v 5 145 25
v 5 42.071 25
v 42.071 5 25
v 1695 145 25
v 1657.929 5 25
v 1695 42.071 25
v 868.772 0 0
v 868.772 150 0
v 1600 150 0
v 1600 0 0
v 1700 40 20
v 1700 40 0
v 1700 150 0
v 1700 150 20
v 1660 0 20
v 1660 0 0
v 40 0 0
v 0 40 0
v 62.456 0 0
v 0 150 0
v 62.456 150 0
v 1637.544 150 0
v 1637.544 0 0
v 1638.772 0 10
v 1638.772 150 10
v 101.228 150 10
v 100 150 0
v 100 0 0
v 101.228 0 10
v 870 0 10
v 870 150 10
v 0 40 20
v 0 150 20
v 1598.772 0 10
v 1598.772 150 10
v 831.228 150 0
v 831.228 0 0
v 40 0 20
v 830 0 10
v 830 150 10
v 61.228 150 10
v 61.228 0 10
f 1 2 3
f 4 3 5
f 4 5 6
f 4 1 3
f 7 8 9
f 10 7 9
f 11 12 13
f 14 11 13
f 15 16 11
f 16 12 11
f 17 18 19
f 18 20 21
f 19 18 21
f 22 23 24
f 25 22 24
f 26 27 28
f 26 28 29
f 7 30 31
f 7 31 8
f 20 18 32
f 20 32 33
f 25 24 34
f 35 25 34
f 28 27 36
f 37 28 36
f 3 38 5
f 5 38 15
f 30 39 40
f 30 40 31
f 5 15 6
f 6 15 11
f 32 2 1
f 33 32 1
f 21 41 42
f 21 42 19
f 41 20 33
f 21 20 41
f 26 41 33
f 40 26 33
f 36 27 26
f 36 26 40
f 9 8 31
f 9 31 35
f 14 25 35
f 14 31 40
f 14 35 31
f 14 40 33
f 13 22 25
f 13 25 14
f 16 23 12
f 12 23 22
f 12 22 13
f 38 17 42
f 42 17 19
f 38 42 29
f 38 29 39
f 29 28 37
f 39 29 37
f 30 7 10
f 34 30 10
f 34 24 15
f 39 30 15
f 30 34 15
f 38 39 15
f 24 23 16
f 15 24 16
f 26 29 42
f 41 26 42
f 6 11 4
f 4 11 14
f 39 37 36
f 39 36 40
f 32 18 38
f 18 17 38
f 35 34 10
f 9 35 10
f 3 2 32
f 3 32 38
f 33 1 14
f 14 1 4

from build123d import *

# Parameters (mm, degrees)
ESQUISSE1_W                  = 1700
ESQUISSE1_H                  = 150
BOSS_EXTRU_1_DEPTH           = 25
ENL_V_MAT_EXTRU_1_DEPTH      = 1707.78791887
ENL_V_MAT_EXTRU_1_DEPTH_BACK = 1707.78791887
CHANFREIN2_SIZE              = 40
CHANFREIN3_SIZE              = 5


with BuildPart() as part:
    # Esquisse1 → Boss.-Extru.1 (new body)
    with BuildSketch(Plane.XY):
        with Locations((850, 75)):
            Rectangle(ESQUISSE1_W, ESQUISSE1_H)
    extrude(amount=BOSS_EXTRU_1_DEPTH)

    # Esquisse2 → Enlèv. mat.-Extru.1 (cut, two sides: drawn at the far end of the back side and taken through both)
    with BuildSketch(Plane(origin=(0, 150, 0), x_dir=(1, 0, 0), z_dir=(0, 1, 0)).offset(-ENL_V_MAT_EXTRU_1_DEPTH_BACK)):
        Polygon((100, 0), (101.227845609, -10), (61.227845609, -10), (62.455691218, 0), align=None)
        Polygon((1637.544308782, 0), (1638.772154391, -10), (1598.772154391, -10), (1600, 0), align=None)
        Polygon((868.772154391, 0), (831.227845609, 0), (830, -10), (870, -10), align=None)
    extrude(amount=ENL_V_MAT_EXTRU_1_DEPTH + ENL_V_MAT_EXTRU_1_DEPTH_BACK, mode=Mode.SUBTRACT)

    # Chanfrein2
    chanfrein2_edges = [part.edges().sort_by_distance(p)[0] for p in [
        (1700, 0, 12.5),
        (0, 0, 12.5),
    ]]
    chamfer(chanfrein2_edges, length=CHANFREIN2_SIZE)

    # Chanfrein3
    chanfrein3_edges = [part.edges().sort_by_distance(p)[0] for p in [
        (850, 150, 25),
        (0, 95, 25),
        (850, 0, 25),
        (1700, 95, 25),
        (1680, 20, 25),
        (20, 20, 25),
    ]]
    chamfer(chanfrein3_edges, length=CHANFREIN3_SIZE)


solid = part.part
